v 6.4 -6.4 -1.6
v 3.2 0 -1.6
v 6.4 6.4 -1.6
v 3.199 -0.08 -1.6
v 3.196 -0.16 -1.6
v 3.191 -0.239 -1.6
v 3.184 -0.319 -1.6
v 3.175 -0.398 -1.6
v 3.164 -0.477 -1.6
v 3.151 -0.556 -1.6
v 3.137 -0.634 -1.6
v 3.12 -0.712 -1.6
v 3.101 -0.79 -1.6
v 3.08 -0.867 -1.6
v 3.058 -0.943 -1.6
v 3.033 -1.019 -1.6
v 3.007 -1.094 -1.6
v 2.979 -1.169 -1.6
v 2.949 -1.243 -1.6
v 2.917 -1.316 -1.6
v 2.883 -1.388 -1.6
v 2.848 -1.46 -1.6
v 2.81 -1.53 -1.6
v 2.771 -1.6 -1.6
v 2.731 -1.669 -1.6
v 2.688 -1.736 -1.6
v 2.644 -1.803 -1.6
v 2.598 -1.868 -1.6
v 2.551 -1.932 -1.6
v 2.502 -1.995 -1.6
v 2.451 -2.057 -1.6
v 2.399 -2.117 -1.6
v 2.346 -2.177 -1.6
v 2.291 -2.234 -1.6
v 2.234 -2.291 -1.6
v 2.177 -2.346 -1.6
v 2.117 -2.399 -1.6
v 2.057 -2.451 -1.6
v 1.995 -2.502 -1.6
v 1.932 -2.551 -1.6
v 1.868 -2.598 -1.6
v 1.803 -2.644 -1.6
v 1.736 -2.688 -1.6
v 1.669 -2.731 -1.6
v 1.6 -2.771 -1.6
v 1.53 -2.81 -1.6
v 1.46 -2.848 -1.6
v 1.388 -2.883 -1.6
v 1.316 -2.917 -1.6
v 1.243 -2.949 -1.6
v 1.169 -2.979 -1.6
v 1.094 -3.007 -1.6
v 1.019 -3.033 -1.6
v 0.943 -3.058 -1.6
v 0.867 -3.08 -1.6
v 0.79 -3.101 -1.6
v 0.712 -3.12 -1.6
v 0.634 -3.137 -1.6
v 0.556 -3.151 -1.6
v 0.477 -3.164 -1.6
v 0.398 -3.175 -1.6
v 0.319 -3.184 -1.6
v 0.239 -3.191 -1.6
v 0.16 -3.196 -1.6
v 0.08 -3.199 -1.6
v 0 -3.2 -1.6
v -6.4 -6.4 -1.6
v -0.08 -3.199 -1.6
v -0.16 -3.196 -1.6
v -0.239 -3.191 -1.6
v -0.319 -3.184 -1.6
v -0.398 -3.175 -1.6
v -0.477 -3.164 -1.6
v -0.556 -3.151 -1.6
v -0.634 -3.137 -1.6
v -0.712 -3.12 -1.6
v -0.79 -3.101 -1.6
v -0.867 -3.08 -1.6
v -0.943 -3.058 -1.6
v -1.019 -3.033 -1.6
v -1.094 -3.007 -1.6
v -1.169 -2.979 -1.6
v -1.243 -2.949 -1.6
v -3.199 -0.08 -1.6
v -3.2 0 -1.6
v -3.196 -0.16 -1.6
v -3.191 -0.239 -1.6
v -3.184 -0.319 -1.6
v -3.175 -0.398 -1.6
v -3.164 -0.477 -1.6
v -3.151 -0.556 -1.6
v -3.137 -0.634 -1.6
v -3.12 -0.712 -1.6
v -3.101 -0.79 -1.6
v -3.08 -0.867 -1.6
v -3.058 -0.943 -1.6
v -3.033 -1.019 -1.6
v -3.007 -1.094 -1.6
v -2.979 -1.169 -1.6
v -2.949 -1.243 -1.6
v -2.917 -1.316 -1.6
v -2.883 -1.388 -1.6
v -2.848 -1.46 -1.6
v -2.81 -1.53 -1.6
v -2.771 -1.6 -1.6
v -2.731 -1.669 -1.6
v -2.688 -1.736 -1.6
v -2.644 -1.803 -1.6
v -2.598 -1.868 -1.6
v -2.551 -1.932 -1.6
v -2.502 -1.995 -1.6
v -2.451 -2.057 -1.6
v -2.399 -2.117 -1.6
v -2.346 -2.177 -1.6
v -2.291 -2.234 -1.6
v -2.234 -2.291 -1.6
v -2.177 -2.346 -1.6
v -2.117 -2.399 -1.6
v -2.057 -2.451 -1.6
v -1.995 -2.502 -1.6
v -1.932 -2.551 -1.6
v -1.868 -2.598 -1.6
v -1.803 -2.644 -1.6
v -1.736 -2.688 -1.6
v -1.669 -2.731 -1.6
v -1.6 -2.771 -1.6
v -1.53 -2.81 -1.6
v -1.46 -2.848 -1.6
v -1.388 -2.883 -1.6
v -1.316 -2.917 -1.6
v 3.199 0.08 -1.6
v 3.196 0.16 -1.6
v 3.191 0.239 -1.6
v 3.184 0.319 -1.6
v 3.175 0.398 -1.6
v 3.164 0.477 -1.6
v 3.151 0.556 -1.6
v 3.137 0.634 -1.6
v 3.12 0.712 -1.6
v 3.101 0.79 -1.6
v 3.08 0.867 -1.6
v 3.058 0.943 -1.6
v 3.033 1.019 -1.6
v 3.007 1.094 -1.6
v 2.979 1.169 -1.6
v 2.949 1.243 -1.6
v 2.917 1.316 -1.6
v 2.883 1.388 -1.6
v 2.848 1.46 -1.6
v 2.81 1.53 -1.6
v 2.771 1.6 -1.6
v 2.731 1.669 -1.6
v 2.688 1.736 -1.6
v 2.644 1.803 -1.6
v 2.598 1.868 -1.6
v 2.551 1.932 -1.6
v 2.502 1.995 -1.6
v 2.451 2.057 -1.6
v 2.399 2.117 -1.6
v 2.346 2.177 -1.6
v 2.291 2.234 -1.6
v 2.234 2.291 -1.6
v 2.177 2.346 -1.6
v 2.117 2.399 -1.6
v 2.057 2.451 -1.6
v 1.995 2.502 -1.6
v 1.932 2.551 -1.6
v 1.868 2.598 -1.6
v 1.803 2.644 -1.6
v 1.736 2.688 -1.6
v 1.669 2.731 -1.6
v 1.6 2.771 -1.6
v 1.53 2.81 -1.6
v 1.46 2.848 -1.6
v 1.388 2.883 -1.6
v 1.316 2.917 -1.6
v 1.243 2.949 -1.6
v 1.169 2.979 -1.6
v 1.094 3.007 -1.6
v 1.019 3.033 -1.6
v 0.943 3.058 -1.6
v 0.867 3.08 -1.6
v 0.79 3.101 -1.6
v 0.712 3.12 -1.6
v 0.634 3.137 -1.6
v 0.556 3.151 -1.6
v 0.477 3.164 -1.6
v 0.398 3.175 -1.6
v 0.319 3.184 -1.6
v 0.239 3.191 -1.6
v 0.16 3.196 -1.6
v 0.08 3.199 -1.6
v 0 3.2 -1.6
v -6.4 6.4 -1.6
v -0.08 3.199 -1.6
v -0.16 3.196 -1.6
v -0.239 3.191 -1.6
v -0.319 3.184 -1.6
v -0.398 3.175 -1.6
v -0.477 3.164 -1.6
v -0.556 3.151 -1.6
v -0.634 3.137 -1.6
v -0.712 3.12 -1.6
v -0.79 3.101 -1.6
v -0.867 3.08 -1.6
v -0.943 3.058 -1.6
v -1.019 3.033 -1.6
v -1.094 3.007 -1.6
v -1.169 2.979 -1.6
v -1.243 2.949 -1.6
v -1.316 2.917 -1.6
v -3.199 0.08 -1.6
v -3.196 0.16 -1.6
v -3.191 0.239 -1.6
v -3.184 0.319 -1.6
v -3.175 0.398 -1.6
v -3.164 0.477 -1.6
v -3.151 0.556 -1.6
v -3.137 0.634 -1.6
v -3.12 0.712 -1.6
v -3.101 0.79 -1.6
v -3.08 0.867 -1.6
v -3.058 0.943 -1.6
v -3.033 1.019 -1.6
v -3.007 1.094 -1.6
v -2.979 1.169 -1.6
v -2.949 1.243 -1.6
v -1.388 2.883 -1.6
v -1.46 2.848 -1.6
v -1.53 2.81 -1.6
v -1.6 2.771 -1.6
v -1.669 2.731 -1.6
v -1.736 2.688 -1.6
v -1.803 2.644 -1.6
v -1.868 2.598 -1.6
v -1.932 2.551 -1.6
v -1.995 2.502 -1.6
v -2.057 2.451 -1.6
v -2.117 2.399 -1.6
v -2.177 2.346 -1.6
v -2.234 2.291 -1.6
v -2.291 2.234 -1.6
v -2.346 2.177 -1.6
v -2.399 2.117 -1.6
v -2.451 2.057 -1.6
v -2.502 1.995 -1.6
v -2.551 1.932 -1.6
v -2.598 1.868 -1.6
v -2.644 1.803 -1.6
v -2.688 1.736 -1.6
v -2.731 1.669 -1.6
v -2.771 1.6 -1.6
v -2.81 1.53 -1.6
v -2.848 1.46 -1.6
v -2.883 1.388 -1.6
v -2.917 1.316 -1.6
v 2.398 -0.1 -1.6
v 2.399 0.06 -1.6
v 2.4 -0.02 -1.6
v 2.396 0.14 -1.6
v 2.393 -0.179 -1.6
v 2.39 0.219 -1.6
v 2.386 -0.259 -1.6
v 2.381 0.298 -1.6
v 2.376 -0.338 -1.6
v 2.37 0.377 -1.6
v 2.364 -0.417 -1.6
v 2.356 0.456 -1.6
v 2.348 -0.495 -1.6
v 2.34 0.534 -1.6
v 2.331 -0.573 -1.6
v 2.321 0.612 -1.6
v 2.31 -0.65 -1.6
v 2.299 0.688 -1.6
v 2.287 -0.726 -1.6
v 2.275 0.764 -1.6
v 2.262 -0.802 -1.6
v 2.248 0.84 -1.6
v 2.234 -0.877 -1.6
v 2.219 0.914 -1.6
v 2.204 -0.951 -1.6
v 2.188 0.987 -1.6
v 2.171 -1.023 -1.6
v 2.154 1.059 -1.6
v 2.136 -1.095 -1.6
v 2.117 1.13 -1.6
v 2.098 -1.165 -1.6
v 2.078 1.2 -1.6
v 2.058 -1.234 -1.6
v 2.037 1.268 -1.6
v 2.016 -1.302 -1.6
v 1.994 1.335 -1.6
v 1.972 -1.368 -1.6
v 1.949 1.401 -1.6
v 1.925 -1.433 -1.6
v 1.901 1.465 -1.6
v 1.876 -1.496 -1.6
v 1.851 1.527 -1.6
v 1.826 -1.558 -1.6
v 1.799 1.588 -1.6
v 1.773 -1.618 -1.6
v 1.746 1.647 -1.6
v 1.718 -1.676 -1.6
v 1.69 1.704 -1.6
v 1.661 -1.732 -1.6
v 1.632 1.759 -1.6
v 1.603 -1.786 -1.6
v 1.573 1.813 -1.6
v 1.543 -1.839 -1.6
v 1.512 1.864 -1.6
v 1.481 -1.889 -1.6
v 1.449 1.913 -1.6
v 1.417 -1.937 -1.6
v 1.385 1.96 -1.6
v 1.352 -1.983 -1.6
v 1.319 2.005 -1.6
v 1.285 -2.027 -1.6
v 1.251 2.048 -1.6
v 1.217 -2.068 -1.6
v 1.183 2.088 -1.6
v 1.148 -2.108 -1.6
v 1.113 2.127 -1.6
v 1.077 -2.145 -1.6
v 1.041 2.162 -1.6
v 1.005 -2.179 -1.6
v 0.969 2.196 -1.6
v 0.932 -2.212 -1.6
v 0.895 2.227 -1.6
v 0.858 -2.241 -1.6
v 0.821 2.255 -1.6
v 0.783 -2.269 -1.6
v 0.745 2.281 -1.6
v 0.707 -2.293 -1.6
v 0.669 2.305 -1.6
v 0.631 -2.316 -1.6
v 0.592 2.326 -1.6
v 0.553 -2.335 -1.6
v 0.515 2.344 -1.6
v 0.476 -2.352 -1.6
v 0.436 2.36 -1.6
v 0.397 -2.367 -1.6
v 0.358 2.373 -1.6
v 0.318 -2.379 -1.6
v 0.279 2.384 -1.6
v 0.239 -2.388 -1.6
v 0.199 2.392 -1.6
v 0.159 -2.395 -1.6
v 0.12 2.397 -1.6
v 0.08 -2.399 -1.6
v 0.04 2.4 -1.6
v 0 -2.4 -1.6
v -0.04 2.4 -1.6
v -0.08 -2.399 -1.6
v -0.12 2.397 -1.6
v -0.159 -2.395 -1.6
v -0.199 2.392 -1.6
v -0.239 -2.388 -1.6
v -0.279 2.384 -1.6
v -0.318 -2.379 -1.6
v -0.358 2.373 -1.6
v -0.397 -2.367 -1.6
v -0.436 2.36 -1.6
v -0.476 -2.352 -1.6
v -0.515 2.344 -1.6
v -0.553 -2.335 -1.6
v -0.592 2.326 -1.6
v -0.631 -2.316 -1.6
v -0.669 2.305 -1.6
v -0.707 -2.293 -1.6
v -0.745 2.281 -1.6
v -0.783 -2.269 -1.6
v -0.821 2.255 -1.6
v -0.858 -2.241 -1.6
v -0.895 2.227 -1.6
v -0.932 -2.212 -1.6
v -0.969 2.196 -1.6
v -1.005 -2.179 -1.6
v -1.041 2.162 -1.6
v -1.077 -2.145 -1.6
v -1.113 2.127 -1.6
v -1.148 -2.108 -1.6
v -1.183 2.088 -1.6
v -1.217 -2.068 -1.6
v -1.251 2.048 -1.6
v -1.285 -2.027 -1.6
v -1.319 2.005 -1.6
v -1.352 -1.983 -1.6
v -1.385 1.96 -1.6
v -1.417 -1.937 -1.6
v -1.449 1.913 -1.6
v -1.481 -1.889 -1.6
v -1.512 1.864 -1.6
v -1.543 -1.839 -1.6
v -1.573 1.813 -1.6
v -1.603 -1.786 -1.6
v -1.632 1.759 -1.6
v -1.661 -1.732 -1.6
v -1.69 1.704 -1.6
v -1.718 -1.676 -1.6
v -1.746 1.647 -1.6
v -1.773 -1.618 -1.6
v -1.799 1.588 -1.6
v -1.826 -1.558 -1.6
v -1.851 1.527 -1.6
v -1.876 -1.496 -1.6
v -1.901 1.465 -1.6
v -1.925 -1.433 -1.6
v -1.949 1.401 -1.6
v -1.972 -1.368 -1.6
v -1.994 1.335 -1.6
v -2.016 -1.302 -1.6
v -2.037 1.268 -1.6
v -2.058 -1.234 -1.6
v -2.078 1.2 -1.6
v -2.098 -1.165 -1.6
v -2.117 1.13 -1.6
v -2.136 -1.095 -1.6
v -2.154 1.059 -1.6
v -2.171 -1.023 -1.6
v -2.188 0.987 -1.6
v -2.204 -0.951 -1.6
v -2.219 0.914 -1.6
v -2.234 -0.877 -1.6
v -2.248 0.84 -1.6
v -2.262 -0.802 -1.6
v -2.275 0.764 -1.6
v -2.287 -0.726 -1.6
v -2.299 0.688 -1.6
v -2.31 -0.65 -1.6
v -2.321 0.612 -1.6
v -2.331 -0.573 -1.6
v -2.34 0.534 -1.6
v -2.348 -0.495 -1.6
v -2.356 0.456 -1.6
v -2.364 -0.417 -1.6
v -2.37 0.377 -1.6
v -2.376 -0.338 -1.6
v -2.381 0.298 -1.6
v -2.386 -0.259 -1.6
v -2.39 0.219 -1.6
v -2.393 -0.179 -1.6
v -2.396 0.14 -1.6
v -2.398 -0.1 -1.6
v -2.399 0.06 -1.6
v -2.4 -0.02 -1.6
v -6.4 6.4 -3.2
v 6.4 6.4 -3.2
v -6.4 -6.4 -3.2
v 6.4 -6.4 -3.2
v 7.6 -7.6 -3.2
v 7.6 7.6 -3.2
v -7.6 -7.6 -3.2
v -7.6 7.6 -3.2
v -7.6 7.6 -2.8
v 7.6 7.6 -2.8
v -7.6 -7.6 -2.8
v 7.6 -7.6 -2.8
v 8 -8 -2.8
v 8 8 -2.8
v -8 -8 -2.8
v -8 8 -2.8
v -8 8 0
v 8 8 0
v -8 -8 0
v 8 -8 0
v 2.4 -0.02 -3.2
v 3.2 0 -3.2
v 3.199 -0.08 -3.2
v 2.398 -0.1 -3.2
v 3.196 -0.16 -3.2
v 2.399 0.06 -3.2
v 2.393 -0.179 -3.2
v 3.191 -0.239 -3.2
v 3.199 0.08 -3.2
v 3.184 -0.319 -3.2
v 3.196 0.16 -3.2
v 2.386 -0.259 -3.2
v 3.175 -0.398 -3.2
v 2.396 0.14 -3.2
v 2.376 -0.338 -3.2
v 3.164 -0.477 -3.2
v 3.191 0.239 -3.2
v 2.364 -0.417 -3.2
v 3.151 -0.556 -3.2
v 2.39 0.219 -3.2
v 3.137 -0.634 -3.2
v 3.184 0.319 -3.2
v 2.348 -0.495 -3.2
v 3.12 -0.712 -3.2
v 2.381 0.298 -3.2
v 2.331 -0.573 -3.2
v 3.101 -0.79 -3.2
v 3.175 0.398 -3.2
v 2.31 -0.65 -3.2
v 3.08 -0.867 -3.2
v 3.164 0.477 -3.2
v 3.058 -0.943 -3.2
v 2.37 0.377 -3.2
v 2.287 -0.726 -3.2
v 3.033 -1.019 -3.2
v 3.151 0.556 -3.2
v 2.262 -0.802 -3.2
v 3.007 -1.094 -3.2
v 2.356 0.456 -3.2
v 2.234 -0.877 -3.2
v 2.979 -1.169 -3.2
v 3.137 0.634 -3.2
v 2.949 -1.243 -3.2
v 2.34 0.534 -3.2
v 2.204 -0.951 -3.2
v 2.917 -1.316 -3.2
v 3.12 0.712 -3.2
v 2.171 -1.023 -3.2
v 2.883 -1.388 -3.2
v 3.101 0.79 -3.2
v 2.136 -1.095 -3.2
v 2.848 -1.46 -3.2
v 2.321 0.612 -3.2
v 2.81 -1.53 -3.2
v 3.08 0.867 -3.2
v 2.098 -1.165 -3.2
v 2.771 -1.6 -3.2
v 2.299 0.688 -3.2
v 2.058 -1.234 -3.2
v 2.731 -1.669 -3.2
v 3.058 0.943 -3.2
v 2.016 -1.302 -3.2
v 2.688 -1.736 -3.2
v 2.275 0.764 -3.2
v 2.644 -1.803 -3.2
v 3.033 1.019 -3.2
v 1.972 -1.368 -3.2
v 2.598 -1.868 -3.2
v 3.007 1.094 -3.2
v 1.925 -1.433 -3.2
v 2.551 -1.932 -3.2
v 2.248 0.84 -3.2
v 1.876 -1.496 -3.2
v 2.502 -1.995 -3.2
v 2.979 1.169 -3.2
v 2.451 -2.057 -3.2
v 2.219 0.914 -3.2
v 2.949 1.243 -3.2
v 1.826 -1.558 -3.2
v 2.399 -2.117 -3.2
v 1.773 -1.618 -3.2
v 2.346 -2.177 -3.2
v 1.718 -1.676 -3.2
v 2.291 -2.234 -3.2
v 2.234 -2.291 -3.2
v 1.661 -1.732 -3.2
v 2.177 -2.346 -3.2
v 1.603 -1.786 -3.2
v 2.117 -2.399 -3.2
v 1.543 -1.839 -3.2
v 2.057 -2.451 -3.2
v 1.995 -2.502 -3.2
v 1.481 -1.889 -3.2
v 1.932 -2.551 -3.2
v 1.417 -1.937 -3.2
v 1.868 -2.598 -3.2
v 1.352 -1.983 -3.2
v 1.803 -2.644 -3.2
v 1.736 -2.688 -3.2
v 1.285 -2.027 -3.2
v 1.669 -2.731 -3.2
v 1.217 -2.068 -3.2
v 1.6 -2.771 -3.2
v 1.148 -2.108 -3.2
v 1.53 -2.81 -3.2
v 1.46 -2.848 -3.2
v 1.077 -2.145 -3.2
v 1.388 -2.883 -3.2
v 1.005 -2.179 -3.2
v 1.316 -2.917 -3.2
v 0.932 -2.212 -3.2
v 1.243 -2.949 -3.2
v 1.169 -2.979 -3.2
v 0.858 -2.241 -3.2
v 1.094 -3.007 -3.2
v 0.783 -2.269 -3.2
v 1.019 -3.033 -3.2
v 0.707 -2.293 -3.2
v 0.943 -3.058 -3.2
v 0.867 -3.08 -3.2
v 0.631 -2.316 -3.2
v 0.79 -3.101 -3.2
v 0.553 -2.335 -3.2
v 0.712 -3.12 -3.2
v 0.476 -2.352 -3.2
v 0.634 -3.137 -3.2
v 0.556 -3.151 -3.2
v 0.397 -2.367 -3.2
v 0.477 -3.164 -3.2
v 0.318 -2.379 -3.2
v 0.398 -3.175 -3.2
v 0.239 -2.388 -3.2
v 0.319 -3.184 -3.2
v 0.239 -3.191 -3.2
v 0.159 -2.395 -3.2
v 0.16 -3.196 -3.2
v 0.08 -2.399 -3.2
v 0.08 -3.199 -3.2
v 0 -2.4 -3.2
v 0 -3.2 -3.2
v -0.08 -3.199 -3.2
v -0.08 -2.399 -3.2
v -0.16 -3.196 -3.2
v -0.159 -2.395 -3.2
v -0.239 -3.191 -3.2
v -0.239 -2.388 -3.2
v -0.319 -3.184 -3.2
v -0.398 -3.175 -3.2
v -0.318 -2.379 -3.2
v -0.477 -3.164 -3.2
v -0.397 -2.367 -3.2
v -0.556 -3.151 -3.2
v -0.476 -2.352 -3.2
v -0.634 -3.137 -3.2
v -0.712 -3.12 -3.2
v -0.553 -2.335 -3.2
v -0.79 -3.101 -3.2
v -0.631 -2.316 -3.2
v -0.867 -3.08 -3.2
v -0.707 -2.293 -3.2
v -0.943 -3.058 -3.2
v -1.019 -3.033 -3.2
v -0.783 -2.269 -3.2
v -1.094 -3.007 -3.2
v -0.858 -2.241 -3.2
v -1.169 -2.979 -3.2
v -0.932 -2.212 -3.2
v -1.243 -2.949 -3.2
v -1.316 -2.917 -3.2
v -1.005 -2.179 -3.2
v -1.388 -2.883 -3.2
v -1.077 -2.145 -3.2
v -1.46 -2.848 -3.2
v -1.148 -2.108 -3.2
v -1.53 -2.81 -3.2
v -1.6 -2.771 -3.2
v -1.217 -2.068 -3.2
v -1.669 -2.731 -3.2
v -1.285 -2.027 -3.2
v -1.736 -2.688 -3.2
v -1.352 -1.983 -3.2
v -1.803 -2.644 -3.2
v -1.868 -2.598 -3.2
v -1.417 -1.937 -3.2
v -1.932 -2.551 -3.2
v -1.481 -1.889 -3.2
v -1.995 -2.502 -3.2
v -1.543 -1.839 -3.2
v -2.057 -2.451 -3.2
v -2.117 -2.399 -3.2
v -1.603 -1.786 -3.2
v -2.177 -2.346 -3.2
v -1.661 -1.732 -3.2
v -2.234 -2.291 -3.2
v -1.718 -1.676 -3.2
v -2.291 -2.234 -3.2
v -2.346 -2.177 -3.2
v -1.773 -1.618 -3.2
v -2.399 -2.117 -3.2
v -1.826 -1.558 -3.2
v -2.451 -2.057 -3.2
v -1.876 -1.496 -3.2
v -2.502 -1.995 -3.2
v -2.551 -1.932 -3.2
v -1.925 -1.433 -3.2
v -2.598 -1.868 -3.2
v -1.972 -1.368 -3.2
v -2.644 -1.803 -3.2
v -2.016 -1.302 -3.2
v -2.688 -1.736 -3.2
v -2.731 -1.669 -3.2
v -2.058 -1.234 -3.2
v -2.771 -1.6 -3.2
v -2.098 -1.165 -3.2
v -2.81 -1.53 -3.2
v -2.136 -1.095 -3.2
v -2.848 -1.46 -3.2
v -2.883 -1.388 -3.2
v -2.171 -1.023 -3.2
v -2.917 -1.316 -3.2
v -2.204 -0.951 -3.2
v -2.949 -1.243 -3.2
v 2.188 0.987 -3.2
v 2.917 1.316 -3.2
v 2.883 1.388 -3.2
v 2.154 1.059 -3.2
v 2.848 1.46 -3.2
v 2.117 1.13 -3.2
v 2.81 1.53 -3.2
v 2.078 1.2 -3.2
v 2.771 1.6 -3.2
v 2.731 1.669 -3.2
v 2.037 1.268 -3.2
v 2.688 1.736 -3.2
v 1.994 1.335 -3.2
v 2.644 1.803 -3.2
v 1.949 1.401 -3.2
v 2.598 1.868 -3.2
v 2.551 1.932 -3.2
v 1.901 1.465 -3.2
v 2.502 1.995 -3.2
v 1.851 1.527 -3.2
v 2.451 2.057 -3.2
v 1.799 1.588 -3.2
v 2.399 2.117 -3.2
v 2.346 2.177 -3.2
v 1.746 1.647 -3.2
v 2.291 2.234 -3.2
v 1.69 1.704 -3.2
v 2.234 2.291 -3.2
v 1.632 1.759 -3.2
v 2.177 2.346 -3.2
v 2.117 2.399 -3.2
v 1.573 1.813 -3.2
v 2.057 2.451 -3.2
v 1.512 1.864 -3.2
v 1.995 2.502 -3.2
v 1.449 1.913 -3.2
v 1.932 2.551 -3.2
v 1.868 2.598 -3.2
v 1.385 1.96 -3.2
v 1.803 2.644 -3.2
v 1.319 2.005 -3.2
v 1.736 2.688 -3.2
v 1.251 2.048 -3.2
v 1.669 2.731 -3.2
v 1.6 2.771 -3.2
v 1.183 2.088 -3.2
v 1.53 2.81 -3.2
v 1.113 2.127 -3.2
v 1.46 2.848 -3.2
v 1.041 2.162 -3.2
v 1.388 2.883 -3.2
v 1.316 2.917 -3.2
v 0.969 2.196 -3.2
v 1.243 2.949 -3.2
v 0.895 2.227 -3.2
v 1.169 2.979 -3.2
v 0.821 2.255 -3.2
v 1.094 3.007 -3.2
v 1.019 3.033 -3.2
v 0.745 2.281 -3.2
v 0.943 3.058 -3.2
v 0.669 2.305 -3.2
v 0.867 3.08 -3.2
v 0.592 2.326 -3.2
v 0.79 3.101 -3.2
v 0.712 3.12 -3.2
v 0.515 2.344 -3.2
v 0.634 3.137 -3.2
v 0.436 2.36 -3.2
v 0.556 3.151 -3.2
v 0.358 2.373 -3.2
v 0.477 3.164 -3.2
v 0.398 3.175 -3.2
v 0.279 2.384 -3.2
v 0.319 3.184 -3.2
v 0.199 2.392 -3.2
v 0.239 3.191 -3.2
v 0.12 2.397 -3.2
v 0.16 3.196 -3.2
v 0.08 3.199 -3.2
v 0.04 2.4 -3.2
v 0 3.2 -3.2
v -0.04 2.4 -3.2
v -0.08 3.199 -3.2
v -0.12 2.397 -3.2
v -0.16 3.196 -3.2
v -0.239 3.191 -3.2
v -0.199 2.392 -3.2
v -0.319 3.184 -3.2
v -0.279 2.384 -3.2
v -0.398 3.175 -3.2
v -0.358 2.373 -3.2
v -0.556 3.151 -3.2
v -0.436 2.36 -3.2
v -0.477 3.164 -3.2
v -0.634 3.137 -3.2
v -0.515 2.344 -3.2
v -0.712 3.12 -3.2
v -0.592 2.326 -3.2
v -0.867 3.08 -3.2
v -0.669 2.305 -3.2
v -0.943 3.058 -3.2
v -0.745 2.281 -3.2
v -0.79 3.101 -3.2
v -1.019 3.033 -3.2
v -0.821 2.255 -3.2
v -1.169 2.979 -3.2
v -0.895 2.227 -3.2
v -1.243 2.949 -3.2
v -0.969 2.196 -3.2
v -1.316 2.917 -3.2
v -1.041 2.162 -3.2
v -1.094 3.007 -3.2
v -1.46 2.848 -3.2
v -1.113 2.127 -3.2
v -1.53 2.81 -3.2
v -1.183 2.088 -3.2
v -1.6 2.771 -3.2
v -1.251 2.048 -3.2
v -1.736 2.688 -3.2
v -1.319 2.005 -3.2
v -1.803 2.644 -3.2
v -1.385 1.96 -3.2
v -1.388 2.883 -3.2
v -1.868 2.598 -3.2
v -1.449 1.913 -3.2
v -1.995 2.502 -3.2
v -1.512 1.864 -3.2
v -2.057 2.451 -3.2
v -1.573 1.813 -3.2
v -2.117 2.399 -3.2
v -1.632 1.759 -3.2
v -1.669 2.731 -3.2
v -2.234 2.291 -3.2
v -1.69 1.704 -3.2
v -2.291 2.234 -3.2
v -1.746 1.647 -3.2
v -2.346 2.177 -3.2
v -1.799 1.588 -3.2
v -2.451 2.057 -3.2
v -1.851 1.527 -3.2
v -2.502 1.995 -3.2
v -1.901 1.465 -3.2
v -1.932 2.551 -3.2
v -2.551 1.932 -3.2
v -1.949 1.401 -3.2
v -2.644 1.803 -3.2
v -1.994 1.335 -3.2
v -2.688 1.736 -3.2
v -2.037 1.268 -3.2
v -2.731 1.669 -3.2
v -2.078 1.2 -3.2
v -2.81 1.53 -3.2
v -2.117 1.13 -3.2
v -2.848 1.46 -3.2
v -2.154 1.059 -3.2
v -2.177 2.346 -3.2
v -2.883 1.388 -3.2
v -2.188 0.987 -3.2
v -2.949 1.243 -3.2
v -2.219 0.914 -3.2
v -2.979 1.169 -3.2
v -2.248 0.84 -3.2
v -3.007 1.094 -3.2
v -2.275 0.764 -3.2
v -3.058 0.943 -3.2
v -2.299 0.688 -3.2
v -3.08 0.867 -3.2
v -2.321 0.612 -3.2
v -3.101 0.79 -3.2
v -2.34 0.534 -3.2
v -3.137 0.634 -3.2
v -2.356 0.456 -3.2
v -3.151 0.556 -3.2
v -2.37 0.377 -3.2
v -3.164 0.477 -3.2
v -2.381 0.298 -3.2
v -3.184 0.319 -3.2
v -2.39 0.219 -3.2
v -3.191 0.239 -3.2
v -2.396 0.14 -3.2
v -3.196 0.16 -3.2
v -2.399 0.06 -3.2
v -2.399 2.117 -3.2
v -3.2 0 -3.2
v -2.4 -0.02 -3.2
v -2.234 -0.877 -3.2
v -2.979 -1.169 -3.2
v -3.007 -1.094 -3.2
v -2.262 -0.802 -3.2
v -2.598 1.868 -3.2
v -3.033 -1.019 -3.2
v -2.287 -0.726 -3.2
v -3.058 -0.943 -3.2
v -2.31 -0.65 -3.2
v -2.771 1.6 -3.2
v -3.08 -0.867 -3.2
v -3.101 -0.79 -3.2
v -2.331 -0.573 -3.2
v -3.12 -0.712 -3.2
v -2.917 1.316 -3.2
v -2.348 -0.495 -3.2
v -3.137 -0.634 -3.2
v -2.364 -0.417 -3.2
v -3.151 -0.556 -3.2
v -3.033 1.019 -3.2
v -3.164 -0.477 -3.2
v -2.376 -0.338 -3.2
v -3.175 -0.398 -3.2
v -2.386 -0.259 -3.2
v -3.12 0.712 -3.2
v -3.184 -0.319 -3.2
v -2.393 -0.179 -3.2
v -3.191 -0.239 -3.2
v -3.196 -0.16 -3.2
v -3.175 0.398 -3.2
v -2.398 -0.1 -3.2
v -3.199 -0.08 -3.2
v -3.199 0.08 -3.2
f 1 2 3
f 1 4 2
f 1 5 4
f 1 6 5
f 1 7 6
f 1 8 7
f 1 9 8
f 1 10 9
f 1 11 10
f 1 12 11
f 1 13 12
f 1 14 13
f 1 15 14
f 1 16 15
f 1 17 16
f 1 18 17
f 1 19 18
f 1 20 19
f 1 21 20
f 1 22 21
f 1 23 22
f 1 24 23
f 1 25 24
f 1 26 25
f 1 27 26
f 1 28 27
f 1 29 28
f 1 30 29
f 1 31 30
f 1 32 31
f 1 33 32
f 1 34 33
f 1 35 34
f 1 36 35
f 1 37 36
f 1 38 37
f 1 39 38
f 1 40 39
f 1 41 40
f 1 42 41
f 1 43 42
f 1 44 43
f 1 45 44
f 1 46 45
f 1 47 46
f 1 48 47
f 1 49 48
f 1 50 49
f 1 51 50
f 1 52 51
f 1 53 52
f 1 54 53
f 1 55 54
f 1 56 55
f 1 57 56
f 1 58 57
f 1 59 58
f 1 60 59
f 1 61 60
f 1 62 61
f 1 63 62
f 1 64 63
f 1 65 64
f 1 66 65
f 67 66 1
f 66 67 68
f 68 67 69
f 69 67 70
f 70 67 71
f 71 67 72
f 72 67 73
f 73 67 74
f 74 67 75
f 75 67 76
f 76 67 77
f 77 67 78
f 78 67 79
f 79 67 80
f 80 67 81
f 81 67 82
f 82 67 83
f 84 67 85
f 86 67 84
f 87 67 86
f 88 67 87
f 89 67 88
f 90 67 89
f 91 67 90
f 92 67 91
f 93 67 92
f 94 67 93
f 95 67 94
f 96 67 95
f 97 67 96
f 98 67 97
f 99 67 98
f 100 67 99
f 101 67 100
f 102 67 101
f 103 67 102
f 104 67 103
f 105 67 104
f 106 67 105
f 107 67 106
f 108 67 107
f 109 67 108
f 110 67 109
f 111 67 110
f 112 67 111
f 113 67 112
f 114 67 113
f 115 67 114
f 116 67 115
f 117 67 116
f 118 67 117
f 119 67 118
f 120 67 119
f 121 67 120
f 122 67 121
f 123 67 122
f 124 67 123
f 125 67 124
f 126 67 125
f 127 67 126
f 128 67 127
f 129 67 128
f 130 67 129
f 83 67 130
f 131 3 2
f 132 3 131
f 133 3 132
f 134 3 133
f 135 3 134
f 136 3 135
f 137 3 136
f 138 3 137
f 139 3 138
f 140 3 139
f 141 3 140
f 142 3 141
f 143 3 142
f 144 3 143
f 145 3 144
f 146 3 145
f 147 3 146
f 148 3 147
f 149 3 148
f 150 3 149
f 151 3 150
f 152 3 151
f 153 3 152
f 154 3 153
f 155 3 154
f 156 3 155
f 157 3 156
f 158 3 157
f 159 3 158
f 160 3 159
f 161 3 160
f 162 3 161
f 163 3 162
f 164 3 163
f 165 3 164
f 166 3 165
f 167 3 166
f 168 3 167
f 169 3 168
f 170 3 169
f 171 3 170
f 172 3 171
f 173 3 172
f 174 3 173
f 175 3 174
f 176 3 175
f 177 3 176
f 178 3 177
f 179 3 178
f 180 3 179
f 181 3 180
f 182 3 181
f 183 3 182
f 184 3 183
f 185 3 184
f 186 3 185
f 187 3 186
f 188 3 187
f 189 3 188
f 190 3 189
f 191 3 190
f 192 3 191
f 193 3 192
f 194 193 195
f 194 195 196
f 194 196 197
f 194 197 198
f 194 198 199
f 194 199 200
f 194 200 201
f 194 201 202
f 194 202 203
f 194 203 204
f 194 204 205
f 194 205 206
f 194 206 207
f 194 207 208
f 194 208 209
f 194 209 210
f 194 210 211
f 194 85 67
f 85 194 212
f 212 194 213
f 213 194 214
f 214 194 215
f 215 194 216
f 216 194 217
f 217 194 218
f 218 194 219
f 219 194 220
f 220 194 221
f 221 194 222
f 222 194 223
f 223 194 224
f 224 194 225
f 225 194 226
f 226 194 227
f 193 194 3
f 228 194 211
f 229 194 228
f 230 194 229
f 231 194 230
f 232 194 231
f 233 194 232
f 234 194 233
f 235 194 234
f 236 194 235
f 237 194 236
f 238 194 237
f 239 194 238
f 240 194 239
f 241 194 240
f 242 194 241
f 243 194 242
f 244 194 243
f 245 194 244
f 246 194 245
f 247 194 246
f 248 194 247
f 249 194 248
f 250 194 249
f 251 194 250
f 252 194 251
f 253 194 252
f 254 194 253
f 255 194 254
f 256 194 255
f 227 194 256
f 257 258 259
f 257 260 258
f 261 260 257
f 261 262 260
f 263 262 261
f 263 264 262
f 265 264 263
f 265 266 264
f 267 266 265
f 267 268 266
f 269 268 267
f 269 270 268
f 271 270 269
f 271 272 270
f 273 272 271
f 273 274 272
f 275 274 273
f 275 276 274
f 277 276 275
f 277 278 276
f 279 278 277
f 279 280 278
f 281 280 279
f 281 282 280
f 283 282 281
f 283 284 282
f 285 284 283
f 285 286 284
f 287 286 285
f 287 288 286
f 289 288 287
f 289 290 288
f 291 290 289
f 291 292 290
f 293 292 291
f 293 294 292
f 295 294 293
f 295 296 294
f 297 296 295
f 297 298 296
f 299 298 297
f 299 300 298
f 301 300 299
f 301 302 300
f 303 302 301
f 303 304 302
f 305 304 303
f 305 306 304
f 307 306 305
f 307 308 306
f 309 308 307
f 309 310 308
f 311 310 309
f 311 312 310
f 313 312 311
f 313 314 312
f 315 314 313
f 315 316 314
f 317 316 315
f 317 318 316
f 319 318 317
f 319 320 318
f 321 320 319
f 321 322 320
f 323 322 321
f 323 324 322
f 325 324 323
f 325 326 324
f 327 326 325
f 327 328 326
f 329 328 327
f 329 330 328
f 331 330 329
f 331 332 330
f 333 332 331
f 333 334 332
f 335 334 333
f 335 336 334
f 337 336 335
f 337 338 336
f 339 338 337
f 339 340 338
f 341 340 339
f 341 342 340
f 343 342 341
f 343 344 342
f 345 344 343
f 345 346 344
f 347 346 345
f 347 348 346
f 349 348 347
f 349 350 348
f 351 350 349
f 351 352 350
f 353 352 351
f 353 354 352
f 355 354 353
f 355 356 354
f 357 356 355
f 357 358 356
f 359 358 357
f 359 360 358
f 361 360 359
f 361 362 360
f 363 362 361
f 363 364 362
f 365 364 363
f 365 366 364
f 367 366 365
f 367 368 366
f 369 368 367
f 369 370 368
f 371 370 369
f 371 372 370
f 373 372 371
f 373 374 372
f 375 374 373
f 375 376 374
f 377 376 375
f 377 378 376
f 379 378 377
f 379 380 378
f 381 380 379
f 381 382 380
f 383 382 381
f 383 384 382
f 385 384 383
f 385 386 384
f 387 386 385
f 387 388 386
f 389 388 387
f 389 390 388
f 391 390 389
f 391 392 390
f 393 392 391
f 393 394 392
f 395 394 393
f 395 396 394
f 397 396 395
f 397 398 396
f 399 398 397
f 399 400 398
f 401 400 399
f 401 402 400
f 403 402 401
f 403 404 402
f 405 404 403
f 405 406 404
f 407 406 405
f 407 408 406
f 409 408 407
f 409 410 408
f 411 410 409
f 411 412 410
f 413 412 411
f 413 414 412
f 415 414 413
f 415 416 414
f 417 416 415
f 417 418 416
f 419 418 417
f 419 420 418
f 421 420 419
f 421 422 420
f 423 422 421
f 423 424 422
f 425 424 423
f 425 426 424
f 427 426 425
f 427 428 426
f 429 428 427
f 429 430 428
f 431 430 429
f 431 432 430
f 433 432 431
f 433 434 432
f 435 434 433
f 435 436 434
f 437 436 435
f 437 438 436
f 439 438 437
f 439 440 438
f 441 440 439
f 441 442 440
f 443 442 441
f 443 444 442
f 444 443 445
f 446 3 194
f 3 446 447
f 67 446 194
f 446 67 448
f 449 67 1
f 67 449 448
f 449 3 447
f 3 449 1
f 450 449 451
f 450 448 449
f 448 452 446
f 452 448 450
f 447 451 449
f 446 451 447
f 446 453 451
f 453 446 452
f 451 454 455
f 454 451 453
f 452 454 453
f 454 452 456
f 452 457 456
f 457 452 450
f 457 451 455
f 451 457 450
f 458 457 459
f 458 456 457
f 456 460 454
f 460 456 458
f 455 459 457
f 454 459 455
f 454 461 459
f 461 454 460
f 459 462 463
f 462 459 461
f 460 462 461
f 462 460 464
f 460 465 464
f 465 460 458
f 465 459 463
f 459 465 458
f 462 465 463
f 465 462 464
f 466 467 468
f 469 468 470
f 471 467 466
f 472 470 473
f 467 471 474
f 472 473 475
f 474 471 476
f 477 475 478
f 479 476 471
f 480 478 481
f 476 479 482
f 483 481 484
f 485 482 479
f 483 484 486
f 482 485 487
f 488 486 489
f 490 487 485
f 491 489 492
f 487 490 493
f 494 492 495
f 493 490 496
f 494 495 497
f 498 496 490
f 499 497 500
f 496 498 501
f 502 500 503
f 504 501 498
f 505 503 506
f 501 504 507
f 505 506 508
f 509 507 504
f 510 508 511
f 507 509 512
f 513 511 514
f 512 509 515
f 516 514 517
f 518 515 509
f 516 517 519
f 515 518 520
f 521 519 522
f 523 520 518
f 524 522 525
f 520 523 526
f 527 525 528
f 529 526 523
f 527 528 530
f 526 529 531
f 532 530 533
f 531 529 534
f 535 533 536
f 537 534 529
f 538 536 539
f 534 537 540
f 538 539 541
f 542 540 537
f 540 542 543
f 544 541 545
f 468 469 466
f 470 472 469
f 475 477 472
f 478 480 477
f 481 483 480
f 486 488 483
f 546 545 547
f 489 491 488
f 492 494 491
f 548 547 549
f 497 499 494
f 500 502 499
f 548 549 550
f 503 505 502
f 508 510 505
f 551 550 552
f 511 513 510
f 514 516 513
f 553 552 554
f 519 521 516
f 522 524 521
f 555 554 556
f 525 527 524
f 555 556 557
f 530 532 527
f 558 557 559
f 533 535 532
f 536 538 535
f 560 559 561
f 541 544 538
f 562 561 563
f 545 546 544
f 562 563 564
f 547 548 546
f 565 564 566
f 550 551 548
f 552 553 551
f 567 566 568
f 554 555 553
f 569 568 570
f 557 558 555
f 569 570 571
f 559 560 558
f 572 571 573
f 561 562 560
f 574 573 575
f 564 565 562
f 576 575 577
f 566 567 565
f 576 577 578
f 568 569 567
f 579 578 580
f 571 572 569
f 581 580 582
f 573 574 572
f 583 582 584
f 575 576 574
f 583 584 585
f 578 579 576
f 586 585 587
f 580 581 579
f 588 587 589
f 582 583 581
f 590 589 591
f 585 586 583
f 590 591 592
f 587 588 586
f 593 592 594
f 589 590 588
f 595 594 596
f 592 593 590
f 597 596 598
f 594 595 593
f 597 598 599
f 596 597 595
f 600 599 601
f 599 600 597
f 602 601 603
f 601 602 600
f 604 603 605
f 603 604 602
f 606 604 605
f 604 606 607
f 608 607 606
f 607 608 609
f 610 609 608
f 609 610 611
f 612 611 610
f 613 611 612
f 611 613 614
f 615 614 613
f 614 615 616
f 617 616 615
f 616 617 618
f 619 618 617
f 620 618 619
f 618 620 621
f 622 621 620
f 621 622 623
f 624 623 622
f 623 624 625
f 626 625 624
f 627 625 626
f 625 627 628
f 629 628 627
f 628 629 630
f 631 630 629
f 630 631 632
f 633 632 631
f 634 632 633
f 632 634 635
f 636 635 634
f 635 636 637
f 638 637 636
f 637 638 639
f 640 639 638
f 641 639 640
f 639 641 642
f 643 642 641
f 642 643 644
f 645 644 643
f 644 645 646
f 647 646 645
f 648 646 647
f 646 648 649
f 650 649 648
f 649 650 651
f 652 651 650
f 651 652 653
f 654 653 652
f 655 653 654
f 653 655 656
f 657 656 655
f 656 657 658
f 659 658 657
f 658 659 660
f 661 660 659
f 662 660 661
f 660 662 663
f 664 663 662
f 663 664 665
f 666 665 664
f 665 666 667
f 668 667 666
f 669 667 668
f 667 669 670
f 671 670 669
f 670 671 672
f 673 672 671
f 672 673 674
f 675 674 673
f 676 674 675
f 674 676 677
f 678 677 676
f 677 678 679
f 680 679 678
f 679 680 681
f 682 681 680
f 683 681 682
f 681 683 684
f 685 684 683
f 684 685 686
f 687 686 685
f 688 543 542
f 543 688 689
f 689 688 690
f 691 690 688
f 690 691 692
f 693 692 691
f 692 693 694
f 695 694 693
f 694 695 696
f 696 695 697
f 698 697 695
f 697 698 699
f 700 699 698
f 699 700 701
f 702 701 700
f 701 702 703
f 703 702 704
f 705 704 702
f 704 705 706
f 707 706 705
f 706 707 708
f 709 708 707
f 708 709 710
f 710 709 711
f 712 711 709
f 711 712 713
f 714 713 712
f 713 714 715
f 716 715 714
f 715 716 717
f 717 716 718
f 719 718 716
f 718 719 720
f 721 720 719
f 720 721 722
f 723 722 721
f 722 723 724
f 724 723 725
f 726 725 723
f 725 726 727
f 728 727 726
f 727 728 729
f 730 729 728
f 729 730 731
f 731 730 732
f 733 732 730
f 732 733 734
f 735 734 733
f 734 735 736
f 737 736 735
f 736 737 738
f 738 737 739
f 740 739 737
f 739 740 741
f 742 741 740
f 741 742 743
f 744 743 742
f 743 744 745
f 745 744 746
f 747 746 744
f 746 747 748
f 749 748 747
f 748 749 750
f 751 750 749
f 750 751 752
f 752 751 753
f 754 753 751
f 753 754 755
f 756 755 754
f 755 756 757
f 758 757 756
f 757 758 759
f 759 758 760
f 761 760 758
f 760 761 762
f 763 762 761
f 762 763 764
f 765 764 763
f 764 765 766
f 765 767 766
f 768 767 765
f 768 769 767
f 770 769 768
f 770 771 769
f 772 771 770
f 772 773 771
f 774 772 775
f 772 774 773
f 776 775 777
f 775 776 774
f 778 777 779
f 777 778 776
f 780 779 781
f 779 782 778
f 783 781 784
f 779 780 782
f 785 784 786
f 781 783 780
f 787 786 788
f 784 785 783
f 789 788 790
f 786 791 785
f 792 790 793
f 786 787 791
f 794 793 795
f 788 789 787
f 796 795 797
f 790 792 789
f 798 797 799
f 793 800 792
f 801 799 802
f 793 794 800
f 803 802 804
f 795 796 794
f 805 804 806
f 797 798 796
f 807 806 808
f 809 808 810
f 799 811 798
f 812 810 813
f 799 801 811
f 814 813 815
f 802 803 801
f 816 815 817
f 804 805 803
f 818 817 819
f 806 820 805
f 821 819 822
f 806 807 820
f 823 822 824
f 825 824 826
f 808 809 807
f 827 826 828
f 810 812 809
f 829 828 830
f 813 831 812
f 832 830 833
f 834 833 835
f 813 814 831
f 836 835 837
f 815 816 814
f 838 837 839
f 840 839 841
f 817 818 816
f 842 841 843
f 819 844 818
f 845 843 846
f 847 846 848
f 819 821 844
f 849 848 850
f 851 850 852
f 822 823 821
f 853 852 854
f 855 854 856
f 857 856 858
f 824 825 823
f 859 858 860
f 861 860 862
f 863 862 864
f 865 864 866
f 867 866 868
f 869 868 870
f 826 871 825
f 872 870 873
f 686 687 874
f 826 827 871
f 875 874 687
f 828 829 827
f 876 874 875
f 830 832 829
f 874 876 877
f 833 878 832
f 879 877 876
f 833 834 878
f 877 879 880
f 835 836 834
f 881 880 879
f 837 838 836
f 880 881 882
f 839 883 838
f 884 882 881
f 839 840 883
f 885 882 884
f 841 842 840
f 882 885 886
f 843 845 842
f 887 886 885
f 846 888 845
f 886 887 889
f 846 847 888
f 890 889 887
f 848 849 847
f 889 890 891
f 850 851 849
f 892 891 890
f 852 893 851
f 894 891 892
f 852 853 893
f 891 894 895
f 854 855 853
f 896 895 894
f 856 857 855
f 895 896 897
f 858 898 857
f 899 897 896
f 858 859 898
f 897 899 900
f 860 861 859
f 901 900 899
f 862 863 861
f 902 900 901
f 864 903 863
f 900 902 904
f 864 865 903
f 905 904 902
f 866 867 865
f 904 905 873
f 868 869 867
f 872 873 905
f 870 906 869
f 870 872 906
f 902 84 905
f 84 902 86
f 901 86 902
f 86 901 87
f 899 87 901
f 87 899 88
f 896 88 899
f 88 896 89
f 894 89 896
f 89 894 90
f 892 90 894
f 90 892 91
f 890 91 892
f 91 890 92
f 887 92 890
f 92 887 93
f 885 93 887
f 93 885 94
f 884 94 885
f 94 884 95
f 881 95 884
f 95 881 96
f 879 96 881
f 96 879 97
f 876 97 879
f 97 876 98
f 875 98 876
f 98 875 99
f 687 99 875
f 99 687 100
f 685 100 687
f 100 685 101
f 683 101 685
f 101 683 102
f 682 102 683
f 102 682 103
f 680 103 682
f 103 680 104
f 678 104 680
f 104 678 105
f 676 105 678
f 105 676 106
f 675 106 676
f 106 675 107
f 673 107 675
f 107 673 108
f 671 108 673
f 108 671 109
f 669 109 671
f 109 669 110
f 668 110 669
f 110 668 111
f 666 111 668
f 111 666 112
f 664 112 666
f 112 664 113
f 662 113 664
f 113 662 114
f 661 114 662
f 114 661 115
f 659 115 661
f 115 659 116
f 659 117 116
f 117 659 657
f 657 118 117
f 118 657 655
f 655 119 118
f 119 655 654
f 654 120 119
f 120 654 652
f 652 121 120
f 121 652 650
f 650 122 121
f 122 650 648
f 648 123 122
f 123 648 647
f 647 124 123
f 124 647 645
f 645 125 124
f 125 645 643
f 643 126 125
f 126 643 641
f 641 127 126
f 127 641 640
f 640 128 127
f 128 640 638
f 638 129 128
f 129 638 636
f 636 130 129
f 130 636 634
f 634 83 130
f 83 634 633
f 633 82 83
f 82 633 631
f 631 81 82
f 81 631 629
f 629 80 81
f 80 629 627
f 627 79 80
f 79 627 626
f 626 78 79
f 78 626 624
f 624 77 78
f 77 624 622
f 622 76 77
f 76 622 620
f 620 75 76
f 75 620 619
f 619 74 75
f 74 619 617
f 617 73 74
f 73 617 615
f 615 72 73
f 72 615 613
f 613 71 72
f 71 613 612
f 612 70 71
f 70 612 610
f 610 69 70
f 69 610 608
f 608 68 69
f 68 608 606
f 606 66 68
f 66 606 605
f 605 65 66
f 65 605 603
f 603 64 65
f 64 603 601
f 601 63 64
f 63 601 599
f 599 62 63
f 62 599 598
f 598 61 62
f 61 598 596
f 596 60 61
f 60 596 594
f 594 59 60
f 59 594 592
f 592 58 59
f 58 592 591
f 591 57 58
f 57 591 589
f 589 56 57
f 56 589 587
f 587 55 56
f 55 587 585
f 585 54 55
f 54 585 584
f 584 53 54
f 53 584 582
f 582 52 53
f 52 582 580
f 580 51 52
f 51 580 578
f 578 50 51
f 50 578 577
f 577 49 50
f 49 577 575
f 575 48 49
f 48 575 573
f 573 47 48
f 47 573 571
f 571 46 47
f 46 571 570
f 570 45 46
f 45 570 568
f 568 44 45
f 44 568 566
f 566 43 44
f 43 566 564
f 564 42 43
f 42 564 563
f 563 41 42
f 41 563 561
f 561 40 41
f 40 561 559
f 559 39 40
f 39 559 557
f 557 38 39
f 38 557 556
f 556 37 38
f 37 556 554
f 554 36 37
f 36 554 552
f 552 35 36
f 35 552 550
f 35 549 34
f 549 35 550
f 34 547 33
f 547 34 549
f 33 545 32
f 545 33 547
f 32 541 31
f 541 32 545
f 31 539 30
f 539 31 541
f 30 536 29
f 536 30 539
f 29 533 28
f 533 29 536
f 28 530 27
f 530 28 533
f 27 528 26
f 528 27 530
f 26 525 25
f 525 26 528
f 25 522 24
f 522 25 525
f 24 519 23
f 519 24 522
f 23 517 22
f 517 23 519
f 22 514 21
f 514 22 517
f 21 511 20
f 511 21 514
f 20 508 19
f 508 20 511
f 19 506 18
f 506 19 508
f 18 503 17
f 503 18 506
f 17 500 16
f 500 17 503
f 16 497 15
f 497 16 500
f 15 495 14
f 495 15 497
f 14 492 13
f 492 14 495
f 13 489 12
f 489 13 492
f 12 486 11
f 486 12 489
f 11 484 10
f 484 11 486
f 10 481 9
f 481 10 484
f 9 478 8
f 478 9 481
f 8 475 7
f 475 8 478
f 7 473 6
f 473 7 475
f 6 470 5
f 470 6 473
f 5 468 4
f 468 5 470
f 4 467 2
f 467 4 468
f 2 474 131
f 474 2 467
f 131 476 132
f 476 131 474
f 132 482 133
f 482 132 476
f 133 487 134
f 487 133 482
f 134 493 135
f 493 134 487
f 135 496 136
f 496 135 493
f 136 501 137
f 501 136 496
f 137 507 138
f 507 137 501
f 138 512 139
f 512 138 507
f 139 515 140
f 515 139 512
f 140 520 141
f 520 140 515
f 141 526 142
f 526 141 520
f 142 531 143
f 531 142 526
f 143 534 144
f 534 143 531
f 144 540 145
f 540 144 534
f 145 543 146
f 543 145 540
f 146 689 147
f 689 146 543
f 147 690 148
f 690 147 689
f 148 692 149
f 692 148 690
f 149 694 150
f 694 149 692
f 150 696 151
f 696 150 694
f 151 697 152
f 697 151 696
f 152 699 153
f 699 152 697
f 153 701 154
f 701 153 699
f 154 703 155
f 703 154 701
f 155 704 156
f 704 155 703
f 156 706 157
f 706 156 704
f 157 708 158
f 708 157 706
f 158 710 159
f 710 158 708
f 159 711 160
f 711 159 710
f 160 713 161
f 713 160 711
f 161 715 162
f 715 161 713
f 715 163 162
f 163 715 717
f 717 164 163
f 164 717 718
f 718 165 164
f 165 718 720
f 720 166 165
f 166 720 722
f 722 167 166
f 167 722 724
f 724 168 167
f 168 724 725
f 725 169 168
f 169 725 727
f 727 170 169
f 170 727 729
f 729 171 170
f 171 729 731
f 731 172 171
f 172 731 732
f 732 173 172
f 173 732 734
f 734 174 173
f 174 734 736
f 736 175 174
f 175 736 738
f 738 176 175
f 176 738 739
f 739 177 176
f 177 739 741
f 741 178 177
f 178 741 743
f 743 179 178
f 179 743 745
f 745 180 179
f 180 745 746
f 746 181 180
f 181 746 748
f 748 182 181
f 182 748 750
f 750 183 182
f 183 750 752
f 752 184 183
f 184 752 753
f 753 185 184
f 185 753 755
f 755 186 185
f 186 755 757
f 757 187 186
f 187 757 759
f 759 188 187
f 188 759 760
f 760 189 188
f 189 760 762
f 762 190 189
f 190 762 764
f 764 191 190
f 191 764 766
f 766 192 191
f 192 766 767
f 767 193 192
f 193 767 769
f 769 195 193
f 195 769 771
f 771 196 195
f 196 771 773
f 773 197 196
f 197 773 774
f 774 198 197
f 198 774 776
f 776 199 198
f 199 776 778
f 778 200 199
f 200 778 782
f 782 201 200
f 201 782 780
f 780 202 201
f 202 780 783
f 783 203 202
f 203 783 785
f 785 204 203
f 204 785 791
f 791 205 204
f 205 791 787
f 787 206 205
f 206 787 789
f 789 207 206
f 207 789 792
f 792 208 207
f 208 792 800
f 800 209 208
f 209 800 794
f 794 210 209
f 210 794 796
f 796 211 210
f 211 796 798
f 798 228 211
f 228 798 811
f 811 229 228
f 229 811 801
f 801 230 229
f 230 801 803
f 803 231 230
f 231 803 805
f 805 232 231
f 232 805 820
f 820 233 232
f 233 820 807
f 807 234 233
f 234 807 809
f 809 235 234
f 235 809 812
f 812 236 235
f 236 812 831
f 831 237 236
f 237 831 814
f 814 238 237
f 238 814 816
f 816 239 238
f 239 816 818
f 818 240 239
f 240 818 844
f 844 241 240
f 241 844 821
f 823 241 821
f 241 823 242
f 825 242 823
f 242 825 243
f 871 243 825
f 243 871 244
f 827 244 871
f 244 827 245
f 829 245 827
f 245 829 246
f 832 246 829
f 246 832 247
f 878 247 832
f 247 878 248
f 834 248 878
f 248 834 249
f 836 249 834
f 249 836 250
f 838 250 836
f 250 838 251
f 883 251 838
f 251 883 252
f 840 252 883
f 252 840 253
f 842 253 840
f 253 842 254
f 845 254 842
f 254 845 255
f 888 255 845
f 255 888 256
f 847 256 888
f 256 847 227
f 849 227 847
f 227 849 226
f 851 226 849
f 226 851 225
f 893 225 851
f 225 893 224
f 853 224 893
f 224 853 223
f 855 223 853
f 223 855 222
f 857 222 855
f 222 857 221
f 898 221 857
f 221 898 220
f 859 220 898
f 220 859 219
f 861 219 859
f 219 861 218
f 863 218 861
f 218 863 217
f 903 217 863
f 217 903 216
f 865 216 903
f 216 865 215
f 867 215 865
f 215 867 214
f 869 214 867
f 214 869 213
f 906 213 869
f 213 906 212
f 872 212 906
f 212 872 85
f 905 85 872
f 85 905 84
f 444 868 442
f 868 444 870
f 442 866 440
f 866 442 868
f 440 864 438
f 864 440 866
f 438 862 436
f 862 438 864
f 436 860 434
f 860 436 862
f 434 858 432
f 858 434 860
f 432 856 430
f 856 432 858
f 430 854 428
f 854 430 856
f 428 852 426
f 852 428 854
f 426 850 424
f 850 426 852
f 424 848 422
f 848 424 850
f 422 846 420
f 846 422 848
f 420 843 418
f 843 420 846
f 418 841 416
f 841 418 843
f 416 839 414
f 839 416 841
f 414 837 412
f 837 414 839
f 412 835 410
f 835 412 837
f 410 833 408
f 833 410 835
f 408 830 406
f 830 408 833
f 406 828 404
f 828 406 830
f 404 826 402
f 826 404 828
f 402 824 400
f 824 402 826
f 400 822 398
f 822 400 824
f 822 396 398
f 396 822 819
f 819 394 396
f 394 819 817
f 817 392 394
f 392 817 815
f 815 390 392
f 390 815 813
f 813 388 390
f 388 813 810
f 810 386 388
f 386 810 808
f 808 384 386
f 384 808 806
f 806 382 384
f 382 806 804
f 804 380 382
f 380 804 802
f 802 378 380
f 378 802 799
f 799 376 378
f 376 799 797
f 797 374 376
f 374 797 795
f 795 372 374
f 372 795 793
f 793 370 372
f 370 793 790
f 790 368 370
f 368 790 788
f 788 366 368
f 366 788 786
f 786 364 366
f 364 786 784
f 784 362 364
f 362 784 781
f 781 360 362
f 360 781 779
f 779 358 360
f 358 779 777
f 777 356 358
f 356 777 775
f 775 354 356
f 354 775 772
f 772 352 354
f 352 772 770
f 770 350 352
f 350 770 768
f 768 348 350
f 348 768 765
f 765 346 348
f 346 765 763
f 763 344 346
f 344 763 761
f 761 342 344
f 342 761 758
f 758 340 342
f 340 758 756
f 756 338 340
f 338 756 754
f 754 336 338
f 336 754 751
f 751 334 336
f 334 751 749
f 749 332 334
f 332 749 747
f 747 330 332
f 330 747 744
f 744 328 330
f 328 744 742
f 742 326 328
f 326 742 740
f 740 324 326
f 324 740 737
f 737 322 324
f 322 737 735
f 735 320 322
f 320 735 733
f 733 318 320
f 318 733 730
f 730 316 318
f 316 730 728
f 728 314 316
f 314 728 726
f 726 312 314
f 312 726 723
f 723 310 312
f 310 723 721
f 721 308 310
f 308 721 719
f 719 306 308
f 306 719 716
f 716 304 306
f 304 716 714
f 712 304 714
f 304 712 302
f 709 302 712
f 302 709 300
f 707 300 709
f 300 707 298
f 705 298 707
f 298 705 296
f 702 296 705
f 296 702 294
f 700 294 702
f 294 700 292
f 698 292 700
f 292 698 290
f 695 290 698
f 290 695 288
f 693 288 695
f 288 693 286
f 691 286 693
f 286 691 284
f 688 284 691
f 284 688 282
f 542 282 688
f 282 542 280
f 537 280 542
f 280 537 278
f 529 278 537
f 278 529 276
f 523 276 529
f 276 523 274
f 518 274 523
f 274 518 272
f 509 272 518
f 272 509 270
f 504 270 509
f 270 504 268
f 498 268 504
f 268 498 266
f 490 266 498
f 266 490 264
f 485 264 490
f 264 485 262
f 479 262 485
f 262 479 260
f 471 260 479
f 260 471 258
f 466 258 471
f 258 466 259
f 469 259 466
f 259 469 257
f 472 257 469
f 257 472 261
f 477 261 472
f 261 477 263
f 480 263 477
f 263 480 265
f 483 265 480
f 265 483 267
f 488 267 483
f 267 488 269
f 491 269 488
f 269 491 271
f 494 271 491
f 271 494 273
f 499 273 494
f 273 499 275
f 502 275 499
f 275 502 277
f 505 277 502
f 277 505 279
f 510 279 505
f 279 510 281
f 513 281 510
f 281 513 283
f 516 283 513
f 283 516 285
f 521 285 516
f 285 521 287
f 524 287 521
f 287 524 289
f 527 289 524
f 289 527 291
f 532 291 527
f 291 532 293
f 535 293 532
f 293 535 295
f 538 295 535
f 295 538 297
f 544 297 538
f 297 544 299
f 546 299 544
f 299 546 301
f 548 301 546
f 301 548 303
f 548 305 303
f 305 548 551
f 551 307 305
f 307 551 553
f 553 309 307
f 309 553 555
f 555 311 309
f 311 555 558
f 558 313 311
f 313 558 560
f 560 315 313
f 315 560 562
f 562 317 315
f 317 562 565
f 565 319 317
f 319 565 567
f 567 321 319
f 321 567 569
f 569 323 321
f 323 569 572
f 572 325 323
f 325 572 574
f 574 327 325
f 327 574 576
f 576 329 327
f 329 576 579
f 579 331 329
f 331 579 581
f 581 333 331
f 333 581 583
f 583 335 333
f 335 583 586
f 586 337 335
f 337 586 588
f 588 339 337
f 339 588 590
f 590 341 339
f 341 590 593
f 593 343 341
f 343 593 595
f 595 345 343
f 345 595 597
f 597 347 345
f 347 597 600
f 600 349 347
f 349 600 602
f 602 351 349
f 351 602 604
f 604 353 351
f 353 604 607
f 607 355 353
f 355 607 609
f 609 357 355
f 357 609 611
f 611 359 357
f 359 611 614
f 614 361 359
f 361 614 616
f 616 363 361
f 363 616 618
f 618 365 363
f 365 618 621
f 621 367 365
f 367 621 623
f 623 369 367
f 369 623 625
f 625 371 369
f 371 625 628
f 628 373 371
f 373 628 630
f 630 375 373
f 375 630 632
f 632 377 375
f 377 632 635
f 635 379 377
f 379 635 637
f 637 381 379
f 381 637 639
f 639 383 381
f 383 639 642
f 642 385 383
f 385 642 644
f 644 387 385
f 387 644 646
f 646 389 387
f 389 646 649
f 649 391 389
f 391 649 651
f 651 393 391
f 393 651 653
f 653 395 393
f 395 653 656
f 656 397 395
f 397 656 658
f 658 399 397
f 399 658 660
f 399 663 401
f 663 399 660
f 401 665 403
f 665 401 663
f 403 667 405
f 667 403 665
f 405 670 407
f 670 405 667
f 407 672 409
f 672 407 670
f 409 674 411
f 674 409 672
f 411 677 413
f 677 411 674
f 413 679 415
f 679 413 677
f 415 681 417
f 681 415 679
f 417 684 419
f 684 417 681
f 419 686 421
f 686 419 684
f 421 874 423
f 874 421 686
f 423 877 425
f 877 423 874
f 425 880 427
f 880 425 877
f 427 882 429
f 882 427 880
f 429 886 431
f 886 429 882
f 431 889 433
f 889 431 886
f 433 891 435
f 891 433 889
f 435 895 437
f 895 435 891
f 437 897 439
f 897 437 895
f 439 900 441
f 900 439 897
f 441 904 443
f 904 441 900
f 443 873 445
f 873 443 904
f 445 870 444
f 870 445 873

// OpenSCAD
use <../lib.scad>
use <s/3068bp09s01.scad>
use <s/3068bp09s02.scad>
use <s/3068bs01.scad>
$fa=1; $fs=0.2;
function ldraw_lib__3068bp09(realsolid=false) = [
// 0 Tile  2 x  2 with Transport Text on Crate Pattern
// 0 Name: 3068bp09.dat
// 0 Author: Takeshi Takahashi [RainbowDolphin]
// 0 !LDRAW_ORG Part UPDATE 2022-04
// 0 !LICENSE Licensed under CC BY 2.0 and CC BY 4.0 : see CAreadme.txt
// 
// 0 BFC CERTIFY CCW
  [0,"BFC","CERTIFY"],
  [0,"BFC","CCW"],
// 
// 0 !KEYWORDS bricklink 3068bpb0054, Set 6393, truck
// 
// 0 !HISTORY 2020-09-05 [PTadmin] Official Update 2020-02
// 0 !HISTORY 2021-06-20 [RainbowDolphin] Subfiled the pattern for common use with 004760b
// 0 !HISTORY 2022-07-18 [PTadmin] Official Update 2022-04
// 
// 
// 1 16 0 0 0 1 0 0 0 1 0 0 0 1 s\3068bs01.dat
  [1,16,0,0,0,1,0,0,0,1,0,0,0,1, ldraw_lib__s__3068bs01(realsolid)],
// 1 15 0 0 0 1 0 0 0 1 0 0 0 1 s\3068bp09s01.dat
  [1,15,0,0,0,1,0,0,0,1,0,0,0,1, ldraw_lib__s__3068bp09s01(realsolid)],
// 1 16 0 0 0 1 0 0 0 1 0 0 0 1 s\3068bp09s02.dat
  [1,16,0,0,0,1,0,0,0,1,0,0,0,1, ldraw_lib__s__3068bp09s02(realsolid)],
// 4 16 15.25 0 18.5 20 0 20 -20 0 20 -15.25 0 18.5
  [4,16,15.25,0,18.5,20,0,20,-20,0,20,-15.25,0,18.5],
// 4 16 -15.25 0 -18.5 -15.25 0 18.5 -20 0 20 -20 0 -20
  [4,16,-15.25,0,-18.5,-15.25,0,18.5,-20,0,20,-20,0,-20],
// 4 16 15.25 0 -18.5 -15.25 0 -18.5 -20 0 -20 20 0 -20
  [4,16,15.25,0,-18.5,-15.25,0,-18.5,-20,0,-20,20,0,-20],
// 4 16 15.25 0 18.5 15.25 0 -18.5 20 0 -20 20 0 20
  [4,16,15.25,0,18.5,15.25,0,-18.5,20,0,-20,20,0,20],
];
module ldraw_lib__3068bp09(step=0, col=false, unit=2/5, alt=false, line=0.2, solid=!$preview)
    makepoly(ldraw_lib__3068bp09(solid), step=step, col=col, unit=unit, alt=alt, line=line, solid=solid);
ldraw_lib__3068bp09(line=0.2);
